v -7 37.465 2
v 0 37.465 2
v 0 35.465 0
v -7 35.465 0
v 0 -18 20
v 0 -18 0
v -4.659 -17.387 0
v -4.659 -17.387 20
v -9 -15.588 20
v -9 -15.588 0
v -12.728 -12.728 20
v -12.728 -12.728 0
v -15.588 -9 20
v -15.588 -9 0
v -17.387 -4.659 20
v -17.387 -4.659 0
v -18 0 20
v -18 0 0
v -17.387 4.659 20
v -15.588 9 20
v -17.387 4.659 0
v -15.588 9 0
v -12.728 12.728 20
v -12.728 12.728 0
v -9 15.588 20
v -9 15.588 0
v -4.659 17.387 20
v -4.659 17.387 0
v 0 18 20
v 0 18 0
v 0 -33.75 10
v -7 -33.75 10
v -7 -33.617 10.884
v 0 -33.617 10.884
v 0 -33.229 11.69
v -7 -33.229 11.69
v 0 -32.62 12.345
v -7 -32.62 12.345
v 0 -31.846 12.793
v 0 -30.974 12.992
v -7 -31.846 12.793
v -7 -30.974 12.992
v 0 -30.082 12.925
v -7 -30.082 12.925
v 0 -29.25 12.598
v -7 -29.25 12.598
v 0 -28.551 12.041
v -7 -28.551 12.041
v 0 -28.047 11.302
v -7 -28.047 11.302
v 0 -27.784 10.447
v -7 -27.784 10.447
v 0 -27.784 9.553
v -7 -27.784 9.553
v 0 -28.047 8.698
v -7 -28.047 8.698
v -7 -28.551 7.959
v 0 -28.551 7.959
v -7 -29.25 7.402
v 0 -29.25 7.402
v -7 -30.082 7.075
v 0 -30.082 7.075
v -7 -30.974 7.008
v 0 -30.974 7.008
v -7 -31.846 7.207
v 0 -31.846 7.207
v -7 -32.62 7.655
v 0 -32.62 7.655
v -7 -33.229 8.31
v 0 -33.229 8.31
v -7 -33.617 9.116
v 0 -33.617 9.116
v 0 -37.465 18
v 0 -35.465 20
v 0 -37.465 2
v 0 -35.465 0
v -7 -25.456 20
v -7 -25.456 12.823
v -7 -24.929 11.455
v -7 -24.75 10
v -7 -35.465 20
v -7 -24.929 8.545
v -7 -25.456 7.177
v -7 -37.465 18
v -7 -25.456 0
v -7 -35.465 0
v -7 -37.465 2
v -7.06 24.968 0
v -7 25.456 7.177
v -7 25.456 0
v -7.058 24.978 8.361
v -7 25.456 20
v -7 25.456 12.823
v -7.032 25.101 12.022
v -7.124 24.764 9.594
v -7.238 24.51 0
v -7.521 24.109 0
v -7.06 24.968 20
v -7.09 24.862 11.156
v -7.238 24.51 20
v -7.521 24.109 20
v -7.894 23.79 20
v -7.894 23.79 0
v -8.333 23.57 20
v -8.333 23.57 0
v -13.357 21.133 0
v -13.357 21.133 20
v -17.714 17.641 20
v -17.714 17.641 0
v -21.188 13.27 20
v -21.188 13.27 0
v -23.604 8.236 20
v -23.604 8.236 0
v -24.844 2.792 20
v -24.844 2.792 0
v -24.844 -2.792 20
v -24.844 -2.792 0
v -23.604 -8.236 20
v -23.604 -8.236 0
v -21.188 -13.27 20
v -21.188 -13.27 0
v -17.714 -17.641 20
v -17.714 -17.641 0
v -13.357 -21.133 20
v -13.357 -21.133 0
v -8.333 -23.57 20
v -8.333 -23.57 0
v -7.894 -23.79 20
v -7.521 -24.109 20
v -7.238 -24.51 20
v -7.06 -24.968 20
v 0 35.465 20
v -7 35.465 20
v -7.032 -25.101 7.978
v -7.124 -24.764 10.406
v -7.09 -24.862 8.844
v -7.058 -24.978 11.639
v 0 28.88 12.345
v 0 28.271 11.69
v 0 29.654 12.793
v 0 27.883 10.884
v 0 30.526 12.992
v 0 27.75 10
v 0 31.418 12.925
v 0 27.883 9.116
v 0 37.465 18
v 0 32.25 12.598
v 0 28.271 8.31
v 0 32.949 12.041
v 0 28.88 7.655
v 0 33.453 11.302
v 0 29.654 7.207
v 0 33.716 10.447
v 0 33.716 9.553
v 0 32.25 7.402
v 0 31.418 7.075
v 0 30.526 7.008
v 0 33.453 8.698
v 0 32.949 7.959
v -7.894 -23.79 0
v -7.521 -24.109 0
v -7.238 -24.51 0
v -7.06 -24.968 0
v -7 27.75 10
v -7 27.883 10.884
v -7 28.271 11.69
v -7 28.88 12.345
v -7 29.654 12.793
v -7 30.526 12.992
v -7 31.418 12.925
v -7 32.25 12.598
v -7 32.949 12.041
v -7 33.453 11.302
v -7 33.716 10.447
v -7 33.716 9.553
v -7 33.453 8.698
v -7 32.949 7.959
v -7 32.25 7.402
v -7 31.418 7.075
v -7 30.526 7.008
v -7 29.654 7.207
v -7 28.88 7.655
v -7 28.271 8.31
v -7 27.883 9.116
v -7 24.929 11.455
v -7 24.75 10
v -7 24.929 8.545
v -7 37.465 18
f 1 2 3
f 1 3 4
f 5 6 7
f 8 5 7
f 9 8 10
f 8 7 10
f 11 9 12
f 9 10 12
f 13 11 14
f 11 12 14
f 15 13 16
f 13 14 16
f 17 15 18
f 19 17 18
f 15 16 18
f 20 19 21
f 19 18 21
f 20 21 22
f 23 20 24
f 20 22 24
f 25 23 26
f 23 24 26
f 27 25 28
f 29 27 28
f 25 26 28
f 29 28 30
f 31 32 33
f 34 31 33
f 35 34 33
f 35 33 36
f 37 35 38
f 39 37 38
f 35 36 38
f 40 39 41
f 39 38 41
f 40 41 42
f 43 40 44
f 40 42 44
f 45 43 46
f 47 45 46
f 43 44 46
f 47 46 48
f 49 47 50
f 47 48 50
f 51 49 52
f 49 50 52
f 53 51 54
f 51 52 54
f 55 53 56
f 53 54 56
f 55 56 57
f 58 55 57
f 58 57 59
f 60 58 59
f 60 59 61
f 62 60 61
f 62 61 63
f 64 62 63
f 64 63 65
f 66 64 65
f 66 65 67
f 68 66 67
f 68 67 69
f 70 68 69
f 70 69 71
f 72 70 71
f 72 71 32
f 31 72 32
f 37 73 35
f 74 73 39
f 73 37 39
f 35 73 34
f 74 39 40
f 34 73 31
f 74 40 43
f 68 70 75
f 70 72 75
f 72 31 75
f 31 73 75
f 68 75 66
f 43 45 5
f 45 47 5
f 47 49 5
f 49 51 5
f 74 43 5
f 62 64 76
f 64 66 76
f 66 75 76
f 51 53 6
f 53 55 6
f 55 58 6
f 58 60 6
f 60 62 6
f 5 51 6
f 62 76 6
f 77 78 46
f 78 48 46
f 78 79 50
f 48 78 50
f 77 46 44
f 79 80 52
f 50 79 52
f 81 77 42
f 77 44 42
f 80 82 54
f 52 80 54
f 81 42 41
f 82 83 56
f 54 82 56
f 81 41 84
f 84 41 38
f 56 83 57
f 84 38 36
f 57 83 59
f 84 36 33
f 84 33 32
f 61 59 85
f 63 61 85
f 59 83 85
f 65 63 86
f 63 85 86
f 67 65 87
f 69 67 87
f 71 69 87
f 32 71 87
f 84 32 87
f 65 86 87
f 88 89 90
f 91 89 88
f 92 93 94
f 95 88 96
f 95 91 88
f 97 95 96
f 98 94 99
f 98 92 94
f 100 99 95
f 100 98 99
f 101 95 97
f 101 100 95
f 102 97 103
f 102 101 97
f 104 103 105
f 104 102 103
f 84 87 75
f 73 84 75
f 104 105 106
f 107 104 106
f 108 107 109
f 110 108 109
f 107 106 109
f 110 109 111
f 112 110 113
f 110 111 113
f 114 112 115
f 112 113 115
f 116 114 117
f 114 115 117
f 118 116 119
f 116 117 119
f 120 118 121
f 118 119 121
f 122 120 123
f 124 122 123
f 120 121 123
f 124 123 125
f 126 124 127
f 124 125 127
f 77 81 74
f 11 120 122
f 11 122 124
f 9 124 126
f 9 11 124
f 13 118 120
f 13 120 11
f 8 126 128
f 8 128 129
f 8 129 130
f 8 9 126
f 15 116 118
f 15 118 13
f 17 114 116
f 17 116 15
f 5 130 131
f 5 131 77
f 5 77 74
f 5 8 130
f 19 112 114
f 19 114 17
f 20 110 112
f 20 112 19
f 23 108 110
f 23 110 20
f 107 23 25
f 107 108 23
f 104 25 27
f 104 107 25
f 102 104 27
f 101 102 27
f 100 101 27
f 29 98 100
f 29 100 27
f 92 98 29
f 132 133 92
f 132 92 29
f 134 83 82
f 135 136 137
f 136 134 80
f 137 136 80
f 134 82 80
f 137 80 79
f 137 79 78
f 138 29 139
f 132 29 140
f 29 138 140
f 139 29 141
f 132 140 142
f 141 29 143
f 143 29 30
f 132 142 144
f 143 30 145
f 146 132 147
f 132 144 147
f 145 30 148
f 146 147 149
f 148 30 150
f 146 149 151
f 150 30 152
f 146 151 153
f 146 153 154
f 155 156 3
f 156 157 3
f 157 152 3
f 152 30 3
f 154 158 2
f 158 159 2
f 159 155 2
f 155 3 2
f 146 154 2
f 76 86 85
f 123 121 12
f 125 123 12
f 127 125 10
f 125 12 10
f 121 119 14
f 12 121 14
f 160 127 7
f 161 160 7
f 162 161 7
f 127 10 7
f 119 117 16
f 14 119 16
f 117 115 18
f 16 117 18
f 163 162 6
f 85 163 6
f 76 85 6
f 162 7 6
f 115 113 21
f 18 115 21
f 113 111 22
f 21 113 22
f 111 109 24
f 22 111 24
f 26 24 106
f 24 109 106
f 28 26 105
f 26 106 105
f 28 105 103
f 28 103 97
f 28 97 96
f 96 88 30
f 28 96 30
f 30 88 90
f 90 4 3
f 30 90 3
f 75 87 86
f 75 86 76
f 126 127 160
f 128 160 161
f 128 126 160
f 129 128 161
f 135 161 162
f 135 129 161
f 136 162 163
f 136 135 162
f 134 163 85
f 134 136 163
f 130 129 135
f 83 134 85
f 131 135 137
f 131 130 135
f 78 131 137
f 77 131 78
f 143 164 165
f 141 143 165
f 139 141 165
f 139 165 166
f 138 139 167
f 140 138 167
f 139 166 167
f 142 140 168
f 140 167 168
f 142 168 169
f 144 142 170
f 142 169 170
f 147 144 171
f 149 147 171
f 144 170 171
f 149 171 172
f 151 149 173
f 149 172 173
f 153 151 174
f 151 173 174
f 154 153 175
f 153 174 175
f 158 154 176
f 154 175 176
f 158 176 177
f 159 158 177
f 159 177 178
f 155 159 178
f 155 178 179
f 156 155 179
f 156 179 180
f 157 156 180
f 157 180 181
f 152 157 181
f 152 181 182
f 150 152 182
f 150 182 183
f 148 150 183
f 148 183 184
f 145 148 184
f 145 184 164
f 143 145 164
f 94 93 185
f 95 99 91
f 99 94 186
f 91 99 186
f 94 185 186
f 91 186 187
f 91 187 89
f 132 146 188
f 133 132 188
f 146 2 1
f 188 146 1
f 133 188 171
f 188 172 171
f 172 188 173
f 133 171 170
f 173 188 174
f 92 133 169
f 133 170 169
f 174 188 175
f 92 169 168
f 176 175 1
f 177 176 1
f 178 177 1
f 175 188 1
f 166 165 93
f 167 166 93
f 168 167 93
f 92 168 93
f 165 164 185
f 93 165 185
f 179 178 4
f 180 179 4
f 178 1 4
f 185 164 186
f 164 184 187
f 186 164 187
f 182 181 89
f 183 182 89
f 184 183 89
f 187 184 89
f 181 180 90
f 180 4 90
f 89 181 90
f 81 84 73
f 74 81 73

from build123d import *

# Parameters (mm, degrees)
F1_DEPTH = 20
F3_D     = 6
F4_SIZE  = 2
F5_R     = 2
F7_D     = 12
F7_DEPTH = 12
F7_TIP   = 3.6051637142
F9_D     = 12
F9_DEPTH = 12
F9_TIP   = 3.6051637142


# Not quite as in the source:
# - a feature names something its author has since deleted; it is built from what else it names


with BuildPart() as f1:
    # F0 (on Top) → F1 (new body)
    with BuildSketch(Plane.XY):
        with BuildLine():
            Line((0, 18), (0, 22.5))
            Line((0, 22.5), (0, 37.4649850279))
            Line((0, 37.4649850279), (-7, 37.4649850279))
            Line((-7, 37.4649850279), (-7, 24))
            ThreePointArc((-7, 24), (-25, 0), (-7, -24))
            Line((-7, -24), (-7, -37.4649850279))
            Line((-7, -37.4649850279), (0, -37.4649850279))
            Line((0, -37.4649850279), (0, -22.5))
            Line((0, -22.5), (0, -18))
            ThreePointArc((0, -18), (-18, 0), (0, 18))
        make_face()
    extrude(amount=F1_DEPTH)

    # F3 (through all)
    with Locations(Plane.YZ):
        with Locations((-30.75, 10), (30.75, 10)):
            Hole(F3_D / 2)

    # F4
    f4_edges = [f1.edges().sort_by_distance(p)[0] for p in [
        (-3.5, -37.464985, 20),
        (-3.5, -37.464985, 0),
        (-3.5, 37.464985, 20),
        (-3.5, 37.464985, 0),
    ]]
    chamfer(f4_edges, length=F4_SIZE)

    # F5
    f5_edges = [f1.edges().sort_by_distance(p)[0] for p in [
        (-7, -24, 10),
        (-7, 24, 10),
    ]]
    fillet(f5_edges, radius=F5_R)

    # F7 (one way)
    with BuildSketch(Plane(origin=(-7, 0, 0), x_dir=(0, -1, 0), z_dir=(1, 0, 0))):
        with Locations((30.75, -10)):
            Circle(F7_D / 2)
    extrude(amount=-F7_DEPTH, mode=Mode.SUBTRACT)
    with Locations(Plane(origin=(-7, 0, 0), x_dir=(0, -1, 0), z_dir=(1, 0, 0))):
        with Locations((30.75, -10)):
            with Locations((0, 0, -(F7_DEPTH + F7_TIP / 2))):  # 118° drill point
                Cone(0, F7_D / 2, F7_TIP, mode=Mode.SUBTRACT)

    # F9 (one way)
    with BuildSketch(Plane(origin=(-7, 0, 0), x_dir=(0, -1, 0), z_dir=(1, 0, 0))):
        with Locations((-30.75, -10)):
            Circle(F9_D / 2)
    extrude(amount=-F9_DEPTH, mode=Mode.SUBTRACT)
    with Locations(Plane(origin=(-7, 0, 0), x_dir=(0, -1, 0), z_dir=(1, 0, 0))):
        with Locations((-30.75, -10)):
            with Locations((0, 0, -(F9_DEPTH + F9_TIP / 2))):  # 118° drill point
                Cone(0, F9_D / 2, F9_TIP, mode=Mode.SUBTRACT)


solid = f1.part
